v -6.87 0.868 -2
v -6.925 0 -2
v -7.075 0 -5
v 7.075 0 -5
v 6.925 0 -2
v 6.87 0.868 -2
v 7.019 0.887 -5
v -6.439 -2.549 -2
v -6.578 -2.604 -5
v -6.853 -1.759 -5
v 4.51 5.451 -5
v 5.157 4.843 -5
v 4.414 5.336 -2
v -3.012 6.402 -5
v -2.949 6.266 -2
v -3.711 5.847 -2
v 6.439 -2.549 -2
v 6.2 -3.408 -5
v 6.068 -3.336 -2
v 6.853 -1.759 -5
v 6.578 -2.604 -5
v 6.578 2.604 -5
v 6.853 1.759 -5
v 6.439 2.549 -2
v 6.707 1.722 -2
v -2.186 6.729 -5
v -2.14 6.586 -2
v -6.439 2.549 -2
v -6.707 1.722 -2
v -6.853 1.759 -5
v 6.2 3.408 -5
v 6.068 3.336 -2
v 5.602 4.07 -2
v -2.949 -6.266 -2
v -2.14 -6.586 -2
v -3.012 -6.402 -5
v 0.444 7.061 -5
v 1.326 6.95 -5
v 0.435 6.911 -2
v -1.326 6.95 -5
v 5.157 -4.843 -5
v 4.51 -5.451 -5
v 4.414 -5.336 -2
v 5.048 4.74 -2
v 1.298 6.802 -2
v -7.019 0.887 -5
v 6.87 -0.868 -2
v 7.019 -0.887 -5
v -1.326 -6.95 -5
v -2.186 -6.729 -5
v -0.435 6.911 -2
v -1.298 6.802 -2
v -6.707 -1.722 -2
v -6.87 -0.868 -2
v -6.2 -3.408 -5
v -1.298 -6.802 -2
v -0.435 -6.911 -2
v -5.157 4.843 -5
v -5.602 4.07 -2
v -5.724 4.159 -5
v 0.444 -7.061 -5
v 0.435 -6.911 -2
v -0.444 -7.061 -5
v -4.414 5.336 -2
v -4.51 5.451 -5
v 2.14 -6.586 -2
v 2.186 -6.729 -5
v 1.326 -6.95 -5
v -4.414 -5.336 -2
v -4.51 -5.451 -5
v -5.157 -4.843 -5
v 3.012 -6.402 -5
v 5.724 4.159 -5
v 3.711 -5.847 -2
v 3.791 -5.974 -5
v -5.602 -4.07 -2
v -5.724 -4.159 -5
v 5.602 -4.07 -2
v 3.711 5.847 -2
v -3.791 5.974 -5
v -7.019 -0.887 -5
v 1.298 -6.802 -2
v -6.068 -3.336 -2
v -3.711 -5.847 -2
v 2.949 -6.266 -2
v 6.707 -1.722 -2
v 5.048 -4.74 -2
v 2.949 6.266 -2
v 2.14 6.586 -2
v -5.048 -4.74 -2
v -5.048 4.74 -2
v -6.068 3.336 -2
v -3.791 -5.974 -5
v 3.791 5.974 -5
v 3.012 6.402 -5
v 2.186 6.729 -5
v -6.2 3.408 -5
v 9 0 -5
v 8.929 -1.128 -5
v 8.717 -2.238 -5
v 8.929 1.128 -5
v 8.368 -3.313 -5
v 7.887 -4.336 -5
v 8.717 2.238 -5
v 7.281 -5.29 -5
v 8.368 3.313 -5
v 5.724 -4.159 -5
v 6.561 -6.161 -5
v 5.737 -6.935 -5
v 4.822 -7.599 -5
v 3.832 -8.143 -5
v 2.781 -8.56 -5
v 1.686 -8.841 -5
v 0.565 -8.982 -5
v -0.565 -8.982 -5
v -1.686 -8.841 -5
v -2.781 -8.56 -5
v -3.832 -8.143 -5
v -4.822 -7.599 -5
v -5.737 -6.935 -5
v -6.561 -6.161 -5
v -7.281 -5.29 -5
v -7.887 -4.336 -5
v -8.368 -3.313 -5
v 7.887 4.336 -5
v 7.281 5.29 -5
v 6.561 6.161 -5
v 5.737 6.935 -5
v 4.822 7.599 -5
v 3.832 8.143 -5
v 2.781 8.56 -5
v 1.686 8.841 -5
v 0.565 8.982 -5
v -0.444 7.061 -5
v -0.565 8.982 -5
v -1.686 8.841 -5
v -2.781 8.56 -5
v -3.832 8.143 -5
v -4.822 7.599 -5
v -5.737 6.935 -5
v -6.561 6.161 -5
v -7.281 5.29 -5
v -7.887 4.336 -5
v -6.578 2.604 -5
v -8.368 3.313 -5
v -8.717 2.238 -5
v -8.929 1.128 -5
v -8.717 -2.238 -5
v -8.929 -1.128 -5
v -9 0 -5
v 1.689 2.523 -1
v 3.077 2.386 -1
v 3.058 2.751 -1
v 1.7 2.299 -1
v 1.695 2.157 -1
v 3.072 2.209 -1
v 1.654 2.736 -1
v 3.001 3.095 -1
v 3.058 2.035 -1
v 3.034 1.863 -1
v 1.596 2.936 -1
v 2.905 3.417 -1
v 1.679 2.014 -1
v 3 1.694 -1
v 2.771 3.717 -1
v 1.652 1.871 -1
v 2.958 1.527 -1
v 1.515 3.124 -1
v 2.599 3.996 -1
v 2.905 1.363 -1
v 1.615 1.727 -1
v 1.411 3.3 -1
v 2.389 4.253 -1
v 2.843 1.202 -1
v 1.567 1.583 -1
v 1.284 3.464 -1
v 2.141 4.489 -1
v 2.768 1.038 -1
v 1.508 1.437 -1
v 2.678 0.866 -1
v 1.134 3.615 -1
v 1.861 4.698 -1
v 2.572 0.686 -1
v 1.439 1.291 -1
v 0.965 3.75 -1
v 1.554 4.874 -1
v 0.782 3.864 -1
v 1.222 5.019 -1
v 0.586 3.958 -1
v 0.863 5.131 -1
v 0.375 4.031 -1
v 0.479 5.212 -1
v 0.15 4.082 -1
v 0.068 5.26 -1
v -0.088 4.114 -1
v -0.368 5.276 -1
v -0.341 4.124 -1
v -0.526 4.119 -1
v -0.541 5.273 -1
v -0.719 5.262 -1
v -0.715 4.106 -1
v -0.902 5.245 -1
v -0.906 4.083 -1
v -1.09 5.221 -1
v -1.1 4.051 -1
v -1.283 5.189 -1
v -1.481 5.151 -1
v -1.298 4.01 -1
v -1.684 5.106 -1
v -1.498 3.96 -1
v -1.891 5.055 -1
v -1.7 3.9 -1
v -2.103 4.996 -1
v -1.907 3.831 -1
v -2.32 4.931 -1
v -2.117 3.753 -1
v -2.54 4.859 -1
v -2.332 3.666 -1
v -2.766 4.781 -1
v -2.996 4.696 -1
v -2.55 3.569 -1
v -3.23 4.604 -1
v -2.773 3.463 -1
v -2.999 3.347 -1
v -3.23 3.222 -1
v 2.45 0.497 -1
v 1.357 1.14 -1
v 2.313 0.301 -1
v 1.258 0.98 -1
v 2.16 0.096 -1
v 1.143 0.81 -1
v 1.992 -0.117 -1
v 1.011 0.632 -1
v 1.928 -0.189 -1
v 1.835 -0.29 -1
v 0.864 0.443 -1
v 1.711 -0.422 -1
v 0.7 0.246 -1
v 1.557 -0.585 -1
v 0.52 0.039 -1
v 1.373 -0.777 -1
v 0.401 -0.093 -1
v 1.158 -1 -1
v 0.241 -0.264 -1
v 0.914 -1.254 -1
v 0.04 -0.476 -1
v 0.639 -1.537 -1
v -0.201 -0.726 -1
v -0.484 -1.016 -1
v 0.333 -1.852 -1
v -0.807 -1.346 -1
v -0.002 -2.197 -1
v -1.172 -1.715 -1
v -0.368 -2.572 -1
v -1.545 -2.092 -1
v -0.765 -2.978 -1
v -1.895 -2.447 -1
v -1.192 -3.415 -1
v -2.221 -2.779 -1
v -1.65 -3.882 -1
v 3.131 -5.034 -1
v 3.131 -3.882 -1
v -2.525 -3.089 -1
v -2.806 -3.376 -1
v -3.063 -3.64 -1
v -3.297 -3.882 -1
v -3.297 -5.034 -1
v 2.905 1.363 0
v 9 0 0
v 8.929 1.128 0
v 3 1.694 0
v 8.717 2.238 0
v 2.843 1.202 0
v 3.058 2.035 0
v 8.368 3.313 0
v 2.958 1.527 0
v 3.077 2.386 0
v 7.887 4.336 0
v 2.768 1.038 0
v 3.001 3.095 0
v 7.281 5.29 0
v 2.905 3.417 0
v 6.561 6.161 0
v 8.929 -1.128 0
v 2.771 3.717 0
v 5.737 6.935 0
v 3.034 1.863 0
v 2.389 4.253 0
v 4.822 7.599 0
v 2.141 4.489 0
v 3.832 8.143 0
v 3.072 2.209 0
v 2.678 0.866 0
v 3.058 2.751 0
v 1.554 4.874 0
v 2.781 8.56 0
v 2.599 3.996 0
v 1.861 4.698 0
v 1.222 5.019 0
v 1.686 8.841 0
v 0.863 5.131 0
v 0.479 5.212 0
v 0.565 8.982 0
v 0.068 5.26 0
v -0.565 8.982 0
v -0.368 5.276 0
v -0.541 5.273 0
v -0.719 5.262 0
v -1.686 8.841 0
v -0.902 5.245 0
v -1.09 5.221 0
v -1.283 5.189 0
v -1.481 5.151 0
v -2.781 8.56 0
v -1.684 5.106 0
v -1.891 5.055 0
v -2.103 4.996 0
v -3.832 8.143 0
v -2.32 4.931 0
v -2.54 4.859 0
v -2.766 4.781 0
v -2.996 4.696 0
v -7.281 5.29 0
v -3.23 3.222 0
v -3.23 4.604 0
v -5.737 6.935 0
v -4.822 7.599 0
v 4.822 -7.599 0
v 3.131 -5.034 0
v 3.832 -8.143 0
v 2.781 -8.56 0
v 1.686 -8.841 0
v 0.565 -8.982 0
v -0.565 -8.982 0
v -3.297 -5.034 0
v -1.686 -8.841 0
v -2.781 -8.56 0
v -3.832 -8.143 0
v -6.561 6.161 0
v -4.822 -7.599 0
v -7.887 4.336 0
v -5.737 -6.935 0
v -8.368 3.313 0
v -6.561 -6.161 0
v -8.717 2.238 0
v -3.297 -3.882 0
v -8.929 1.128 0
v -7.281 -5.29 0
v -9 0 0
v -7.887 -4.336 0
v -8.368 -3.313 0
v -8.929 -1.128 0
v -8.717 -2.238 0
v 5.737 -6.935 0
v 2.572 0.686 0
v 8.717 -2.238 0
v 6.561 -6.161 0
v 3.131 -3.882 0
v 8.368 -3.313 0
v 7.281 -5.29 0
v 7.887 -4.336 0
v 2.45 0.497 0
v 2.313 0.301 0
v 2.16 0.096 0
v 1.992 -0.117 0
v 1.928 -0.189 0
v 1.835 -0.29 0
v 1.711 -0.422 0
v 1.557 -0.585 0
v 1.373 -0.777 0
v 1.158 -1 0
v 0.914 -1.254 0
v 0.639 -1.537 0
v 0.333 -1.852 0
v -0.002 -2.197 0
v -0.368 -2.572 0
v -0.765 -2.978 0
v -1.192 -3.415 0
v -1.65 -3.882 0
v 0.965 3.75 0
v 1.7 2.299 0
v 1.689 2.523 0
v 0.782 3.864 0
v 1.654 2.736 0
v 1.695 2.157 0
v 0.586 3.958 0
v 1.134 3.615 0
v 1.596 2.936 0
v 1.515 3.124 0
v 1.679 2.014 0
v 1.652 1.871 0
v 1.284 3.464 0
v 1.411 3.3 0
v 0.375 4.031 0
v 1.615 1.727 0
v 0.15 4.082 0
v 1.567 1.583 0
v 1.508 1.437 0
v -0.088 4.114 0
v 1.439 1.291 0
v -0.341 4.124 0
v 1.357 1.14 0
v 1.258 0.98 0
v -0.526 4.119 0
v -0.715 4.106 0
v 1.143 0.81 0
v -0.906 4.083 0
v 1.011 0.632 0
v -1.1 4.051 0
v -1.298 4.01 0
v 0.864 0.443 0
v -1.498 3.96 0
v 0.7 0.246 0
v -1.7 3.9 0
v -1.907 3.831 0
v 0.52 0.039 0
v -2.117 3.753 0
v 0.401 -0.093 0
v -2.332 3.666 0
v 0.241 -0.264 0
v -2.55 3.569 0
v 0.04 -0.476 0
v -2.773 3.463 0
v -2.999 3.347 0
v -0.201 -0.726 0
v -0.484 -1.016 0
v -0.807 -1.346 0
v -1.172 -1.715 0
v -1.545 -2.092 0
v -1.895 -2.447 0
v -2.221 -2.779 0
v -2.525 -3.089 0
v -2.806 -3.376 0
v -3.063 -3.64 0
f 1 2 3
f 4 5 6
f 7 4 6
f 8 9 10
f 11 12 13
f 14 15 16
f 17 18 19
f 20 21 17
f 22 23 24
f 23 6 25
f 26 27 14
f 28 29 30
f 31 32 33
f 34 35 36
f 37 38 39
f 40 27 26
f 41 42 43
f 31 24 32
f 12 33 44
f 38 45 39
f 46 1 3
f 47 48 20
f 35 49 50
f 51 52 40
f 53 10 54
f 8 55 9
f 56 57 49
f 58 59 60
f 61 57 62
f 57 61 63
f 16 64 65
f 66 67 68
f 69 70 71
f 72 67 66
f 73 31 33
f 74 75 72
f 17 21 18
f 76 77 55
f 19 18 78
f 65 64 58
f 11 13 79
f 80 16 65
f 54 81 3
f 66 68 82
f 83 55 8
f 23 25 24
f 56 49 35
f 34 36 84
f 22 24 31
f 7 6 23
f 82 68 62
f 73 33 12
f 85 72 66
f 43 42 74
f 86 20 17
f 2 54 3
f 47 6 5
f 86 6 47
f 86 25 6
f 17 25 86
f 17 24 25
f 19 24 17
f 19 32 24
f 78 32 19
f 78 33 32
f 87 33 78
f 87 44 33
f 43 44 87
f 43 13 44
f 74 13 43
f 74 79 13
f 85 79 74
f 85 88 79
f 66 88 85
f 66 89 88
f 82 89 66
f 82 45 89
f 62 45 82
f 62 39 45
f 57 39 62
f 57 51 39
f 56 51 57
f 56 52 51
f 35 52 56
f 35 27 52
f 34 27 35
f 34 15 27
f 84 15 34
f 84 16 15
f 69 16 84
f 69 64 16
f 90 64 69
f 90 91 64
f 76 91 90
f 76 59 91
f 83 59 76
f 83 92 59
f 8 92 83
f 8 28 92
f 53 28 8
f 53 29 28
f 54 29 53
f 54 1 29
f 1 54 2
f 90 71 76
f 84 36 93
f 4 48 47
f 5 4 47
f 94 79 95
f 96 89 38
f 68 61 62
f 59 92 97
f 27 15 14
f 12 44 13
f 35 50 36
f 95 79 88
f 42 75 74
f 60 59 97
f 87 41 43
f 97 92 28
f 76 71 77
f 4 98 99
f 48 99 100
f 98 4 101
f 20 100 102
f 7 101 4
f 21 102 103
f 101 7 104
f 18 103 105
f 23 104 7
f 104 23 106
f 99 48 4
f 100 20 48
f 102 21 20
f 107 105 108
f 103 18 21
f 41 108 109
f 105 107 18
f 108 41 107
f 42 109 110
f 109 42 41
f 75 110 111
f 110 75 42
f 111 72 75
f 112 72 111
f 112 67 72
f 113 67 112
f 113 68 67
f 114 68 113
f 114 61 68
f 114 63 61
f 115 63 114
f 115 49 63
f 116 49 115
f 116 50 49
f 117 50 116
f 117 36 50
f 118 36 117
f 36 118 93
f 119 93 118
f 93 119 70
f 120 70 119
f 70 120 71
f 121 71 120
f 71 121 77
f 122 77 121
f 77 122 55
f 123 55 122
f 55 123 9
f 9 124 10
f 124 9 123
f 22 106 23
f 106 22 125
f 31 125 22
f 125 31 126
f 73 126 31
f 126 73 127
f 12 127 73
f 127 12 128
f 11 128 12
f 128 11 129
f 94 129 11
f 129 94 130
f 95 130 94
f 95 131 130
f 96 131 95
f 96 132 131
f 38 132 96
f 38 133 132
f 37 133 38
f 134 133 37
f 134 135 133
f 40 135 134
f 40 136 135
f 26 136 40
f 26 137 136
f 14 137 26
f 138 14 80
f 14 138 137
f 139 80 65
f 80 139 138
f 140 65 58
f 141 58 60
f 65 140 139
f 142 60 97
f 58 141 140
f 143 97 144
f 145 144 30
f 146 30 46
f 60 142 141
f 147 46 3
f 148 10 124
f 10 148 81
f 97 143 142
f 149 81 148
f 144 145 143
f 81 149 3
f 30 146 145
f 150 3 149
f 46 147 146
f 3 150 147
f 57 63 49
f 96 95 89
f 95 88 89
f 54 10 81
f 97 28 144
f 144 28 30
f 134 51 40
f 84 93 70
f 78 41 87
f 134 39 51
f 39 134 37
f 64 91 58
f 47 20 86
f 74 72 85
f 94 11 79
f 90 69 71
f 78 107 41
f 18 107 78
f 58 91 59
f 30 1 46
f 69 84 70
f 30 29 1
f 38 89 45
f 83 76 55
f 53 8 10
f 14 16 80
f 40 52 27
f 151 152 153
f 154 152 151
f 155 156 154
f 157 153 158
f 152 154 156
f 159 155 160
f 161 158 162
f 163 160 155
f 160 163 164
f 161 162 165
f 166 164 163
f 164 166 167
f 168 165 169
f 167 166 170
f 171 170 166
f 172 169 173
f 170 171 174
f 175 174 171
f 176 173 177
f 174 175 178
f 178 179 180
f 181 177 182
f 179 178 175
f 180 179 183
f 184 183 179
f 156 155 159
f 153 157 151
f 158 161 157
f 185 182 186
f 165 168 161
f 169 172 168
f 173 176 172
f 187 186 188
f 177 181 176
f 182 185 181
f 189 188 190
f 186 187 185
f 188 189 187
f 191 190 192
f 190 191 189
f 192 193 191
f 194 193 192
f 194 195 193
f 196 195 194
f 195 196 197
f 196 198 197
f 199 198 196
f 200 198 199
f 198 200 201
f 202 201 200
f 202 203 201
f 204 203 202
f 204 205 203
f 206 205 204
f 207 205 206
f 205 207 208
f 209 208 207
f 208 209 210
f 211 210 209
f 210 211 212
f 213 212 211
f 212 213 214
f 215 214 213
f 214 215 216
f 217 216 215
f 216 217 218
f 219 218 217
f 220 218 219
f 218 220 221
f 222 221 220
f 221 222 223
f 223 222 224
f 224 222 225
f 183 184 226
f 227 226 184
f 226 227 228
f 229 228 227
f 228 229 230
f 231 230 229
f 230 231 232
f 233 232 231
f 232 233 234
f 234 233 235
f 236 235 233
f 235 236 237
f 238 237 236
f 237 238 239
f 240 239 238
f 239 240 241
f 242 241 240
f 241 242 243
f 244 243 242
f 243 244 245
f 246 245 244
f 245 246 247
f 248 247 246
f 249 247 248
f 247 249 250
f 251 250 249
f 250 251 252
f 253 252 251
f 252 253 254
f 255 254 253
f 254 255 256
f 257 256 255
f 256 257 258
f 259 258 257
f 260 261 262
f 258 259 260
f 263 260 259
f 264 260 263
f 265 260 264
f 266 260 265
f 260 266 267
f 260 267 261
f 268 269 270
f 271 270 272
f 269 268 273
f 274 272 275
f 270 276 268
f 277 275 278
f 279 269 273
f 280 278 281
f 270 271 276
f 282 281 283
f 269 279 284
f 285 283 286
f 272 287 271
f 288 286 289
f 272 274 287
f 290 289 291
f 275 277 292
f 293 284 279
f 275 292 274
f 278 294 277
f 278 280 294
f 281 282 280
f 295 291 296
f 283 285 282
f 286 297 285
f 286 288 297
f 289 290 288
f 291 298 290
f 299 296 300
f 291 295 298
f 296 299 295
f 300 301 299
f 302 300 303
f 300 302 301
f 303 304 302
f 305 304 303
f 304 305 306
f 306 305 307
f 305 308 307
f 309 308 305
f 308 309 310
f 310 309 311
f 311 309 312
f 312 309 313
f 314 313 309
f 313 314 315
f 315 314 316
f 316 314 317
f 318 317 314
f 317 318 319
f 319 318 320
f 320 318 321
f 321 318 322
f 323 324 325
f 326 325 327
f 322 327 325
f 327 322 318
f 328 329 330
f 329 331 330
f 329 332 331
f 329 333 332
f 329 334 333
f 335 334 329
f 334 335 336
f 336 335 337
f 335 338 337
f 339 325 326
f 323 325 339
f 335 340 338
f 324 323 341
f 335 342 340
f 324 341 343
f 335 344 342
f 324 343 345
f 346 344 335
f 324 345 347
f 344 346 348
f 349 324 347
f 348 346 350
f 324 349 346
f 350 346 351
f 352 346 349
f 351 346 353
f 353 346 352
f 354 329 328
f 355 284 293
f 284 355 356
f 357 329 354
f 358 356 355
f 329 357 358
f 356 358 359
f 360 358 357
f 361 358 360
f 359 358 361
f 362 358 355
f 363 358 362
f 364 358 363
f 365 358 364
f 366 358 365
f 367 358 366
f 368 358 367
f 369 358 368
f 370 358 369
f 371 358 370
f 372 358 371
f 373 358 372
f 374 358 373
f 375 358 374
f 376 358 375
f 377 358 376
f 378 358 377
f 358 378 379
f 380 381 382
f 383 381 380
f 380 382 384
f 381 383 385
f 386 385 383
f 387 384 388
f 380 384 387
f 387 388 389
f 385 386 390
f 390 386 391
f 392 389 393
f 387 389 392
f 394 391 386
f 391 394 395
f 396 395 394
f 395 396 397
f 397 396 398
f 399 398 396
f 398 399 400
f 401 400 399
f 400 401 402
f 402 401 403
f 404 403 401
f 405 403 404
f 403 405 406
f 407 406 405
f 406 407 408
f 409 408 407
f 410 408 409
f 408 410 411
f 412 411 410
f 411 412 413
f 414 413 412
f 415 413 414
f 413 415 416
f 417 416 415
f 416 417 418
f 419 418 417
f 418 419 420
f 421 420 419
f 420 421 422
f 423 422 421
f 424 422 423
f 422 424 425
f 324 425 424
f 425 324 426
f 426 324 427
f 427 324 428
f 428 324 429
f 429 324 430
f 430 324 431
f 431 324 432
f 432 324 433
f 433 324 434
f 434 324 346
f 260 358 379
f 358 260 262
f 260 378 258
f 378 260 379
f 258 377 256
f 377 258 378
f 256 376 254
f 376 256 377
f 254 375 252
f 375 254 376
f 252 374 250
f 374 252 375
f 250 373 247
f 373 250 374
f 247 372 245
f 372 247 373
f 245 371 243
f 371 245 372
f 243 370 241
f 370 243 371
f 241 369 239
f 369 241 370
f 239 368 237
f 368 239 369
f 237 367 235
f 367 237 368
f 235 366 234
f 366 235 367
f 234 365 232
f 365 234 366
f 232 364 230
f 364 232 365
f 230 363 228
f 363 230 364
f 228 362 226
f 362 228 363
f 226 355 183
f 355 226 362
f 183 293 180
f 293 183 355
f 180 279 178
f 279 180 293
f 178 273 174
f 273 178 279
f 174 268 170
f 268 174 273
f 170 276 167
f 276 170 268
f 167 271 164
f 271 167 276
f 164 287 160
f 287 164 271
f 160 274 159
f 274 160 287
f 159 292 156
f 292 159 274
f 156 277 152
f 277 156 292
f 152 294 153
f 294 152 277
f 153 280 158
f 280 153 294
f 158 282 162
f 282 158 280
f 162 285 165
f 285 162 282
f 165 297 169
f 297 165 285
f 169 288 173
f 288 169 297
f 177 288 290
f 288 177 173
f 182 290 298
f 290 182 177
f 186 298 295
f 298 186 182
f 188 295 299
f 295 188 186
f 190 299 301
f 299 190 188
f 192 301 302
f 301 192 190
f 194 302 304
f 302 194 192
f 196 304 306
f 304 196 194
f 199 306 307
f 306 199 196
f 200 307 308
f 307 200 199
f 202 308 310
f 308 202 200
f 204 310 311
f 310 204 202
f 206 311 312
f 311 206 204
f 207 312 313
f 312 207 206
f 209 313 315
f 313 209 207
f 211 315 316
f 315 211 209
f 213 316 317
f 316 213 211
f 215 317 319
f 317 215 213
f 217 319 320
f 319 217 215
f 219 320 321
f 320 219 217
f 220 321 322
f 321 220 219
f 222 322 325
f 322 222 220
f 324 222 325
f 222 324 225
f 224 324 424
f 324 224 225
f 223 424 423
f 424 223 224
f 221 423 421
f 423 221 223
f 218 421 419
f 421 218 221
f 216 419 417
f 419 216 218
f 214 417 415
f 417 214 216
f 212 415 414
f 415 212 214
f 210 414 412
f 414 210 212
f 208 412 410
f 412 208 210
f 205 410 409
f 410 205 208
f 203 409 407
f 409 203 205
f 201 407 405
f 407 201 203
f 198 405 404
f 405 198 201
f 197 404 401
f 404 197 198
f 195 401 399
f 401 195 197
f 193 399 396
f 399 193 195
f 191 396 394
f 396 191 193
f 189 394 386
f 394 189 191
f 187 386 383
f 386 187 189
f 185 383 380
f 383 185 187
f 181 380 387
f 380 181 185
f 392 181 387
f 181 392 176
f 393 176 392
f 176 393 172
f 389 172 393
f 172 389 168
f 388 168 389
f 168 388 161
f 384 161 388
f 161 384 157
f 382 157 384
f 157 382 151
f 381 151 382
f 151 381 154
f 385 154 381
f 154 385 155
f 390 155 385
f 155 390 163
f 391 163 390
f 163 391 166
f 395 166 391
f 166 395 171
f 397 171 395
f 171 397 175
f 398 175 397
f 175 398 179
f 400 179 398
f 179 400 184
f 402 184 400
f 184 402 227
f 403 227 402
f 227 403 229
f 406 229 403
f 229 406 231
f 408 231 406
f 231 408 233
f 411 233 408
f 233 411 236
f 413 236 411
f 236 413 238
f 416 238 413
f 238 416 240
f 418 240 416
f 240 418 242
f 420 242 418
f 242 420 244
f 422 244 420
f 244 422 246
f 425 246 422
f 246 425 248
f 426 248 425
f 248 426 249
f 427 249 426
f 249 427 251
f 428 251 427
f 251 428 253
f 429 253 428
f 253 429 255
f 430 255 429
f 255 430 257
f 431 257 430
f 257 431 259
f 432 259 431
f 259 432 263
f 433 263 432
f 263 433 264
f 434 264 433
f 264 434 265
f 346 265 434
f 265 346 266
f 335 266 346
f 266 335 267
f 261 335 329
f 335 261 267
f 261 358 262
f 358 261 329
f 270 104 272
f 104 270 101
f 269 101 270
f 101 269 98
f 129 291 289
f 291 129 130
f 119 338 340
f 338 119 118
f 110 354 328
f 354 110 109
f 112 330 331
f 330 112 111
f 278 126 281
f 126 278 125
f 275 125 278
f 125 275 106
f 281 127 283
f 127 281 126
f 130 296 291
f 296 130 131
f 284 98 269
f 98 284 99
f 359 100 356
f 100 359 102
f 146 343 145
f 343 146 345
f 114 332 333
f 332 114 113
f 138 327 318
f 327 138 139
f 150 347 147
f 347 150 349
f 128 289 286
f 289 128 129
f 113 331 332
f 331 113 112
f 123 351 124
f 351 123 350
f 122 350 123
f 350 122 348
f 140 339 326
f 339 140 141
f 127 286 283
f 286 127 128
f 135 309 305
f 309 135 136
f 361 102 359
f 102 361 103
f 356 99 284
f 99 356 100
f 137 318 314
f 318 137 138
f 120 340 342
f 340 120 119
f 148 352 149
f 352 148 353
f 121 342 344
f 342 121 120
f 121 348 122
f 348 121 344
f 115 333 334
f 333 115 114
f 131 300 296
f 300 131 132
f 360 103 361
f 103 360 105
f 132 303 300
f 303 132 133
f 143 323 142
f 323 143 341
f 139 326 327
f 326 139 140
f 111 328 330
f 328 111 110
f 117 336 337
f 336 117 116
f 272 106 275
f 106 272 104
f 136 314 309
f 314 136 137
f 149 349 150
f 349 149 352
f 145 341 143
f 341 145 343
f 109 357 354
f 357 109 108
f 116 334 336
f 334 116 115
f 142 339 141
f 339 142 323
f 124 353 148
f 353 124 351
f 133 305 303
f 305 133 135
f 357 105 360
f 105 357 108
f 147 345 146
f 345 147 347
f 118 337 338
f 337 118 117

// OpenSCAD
$fn = 50;

difference() {
	union() {
		translate(v = [0, 0, -5.0]) {
			cylinder(h = 5, r = 9.0);
		}
	}
	union() {
		#translate(v = [0, 0, -5.0]) {
			cylinder(h = 3, r1 = 7.075, r2 = 6.925);
		}
		translate(v = [0, 0, -1]) {
			linear_extrude(height = 1) {
				text(font = "Impact", halign = "center", size = 10, text = "2", valign = "center");
			}
		}
	}
}
